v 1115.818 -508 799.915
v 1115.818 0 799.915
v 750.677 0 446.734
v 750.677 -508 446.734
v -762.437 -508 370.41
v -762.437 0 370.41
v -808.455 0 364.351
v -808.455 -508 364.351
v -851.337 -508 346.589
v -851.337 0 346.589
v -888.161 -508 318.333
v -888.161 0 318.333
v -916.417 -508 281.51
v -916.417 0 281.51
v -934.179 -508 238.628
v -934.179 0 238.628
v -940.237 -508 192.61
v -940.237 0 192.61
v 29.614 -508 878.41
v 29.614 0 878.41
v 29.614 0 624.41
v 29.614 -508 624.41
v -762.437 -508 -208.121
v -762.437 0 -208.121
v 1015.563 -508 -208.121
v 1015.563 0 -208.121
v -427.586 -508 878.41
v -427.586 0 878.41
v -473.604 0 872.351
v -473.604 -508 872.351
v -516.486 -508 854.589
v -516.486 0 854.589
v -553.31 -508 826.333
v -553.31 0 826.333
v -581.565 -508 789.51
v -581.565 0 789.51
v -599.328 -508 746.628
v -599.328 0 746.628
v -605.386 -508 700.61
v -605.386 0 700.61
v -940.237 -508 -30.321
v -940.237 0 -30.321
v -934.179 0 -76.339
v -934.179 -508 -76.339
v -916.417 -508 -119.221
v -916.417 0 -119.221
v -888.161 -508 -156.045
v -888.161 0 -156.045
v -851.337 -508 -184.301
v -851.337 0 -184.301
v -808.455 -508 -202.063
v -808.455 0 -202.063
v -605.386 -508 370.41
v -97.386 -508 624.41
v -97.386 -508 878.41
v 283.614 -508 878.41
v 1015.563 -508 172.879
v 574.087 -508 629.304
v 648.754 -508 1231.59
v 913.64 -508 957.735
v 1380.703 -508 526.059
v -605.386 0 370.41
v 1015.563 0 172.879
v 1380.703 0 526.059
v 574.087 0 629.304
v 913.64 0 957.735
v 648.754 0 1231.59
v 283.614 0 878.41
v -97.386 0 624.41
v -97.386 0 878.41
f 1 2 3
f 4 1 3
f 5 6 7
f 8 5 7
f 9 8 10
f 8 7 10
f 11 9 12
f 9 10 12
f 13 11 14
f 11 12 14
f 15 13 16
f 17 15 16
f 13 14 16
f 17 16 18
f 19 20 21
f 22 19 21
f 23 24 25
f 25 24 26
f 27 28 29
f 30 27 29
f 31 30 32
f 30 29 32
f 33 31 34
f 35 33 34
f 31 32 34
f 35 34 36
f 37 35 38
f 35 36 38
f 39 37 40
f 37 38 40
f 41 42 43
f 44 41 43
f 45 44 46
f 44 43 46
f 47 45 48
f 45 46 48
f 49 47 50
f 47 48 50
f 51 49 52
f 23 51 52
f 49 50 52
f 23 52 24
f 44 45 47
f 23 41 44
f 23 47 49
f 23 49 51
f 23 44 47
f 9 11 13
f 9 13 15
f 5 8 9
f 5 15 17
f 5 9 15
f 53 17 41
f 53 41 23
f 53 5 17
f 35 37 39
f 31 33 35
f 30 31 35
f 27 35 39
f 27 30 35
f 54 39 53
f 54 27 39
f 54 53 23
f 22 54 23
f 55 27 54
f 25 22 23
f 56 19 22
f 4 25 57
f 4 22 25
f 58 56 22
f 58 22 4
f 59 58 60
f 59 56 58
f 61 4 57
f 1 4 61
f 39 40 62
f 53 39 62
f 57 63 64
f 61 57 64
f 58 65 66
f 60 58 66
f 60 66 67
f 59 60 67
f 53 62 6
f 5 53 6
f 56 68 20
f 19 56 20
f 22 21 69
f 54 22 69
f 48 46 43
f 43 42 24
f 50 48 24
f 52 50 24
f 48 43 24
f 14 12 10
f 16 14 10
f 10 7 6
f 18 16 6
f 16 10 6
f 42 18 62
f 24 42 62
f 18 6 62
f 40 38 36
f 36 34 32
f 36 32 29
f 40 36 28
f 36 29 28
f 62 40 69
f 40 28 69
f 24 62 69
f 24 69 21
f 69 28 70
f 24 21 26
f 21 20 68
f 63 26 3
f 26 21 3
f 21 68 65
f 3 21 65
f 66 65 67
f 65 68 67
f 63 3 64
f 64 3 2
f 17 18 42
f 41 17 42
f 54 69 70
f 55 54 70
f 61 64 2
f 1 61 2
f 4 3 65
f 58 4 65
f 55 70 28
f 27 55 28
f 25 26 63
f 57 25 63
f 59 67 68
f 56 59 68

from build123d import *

# Parameters (mm, degrees)
F1_DEPTH = 508


with BuildPart() as f1:
    # F0 (on Front) → F1 (new body)
    with BuildSketch(Plane.XZ):
        with BuildLine():
            Line((-940.237215, 192.609879), (-940.237215, -30.321289))
            ThreePointArc((-940.237215, -30.321289), (-888.160801, -156.044874), (-762.437215, -208.121289))
            Line((-762.437215, -208.121289), (1015.562785, -208.121289))
            Line((1015.562785, -208.121289), (1015.562785, 172.878711))
            Line((1015.562785, 172.878711), (1380.703211, 526.059216))
            Line((1380.703211, 526.059216), (1115.817833, 799.914536))
            Line((1115.817833, 799.914536), (750.677406, 446.734031))
            Line((750.677406, 446.734031), (574.087154, 629.304244))
            Line((574.087154, 629.304244), (913.639785, 957.735064))
            Line((913.639785, 957.735064), (648.754406, 1231.590384))
            Line((648.754406, 1231.590384), (283.613979, 878.409879))
            Line((283.613979, 878.409879), (29.613979, 878.409879))
            Line((29.613979, 878.409879), (29.613979, 624.409879))
            Line((29.613979, 624.409879), (-97.386021, 624.409879))
            Line((-97.386021, 624.409879), (-97.386021, 878.409879))
            Line((-97.386021, 878.409879), (-427.586021, 878.409879))
            ThreePointArc((-427.586021, 878.409879), (-553.309606, 826.333464), (-605.386021, 700.609879))
            Line((-605.386021, 700.609879), (-605.386021, 370.409879))
            Line((-605.386021, 370.409879), (-762.437215, 370.409879))
            ThreePointArc((-762.437215, 370.409879), (-888.160801, 318.333464), (-940.237215, 192.609879))
        make_face()
    extrude(amount=F1_DEPTH)


solid = f1.part
